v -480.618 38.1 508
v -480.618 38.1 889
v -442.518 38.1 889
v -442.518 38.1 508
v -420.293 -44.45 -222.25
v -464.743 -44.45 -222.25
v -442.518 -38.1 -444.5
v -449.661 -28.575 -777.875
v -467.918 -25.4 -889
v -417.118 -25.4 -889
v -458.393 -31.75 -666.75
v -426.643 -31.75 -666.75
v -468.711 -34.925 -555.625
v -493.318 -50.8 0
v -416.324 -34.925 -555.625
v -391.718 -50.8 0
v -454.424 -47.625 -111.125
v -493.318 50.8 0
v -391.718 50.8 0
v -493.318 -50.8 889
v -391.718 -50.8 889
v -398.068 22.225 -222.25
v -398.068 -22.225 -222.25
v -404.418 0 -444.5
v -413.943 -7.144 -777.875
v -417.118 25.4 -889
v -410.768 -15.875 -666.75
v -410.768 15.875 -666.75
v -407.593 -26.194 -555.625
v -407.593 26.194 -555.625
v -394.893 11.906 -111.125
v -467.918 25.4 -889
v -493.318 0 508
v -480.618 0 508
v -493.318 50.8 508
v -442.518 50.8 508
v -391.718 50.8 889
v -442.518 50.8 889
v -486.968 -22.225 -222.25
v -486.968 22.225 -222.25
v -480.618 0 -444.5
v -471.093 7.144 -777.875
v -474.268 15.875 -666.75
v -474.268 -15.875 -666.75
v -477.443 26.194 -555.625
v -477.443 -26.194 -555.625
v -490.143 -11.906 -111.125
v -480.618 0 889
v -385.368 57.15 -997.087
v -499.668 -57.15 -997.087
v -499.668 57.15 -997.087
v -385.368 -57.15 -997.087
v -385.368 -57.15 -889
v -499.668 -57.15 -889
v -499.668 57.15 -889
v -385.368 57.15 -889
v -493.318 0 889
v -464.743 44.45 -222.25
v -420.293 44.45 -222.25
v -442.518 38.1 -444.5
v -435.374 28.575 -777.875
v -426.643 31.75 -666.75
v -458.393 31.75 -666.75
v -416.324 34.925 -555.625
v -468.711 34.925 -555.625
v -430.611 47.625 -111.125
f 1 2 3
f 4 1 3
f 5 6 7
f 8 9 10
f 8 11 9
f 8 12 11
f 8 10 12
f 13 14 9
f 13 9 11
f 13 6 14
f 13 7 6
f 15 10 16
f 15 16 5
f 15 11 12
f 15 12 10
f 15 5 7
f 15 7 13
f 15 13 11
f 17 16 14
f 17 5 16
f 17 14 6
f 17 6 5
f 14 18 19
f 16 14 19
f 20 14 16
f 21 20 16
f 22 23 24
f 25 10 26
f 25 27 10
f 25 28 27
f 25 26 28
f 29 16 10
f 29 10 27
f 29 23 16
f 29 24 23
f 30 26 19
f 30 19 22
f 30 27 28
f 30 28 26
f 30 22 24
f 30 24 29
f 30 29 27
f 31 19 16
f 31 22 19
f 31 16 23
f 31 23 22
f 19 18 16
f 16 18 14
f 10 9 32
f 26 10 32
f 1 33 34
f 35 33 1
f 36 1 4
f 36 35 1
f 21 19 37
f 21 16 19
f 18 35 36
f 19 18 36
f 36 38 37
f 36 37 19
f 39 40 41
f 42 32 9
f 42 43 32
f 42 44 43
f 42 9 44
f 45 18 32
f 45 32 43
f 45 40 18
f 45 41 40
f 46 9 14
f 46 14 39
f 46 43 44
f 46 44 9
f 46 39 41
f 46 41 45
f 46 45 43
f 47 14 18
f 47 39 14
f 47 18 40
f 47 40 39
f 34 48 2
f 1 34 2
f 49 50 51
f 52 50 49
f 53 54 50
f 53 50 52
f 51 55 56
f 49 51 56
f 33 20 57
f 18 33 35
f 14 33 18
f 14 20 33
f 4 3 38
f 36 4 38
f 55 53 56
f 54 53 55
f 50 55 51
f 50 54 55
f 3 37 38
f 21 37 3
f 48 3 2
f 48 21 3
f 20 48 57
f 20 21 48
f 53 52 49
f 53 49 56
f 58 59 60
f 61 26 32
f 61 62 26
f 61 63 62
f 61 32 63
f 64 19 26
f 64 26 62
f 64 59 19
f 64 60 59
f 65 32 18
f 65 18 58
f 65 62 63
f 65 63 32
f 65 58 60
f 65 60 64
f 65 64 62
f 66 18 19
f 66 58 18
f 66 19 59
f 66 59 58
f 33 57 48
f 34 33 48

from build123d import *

# Parameters (mm, degrees)
F1_DEPTH  = 57.15
F2_DEPTH  = 50.8
F3_W      = 50.8
F3_H      = 50.8
F2_FACE_W = 101.6
F2_FACE_H = 101.6
F6_DEPTH  = 381


with BuildPart() as f1:
    # F0 (on Front) → F1 (new body, symmetric)
    with BuildSketch(Plane.XZ):
        Polygon((-417.117681, -889), (-467.917681, -889), (-499.667681, -889), (-499.667681, -997.087122), (-385.367681, -997.087122), (-385.367681, -889), align=None)
    extrude(amount=F1_DEPTH, both=True)


with BuildPart() as f2:
    # F0 (on Front) → F2 (new body, symmetric)
    with BuildSketch(Plane.XZ):
        Polygon((-391.717681, 889), (-493.317681, 889), (-493.317681, 0), (-467.917681, 0), (-417.117681, 0), (-391.717681, 0), align=None)
    extrude(amount=F2_DEPTH, both=True)

    # F5 (on face) → F6 (cut)
    with BuildSketch(Plane.XY.offset(889)):
        Polygon((-480.617681, 38.1), (-442.517681, 38.1), (-442.517681, 50.8), (-493.317681, 50.8), (-493.317681, 0), (-480.617681, 0), align=None)
    extrude(amount=-F6_DEPTH, mode=Mode.SUBTRACT)


with BuildPart() as f4:
    # F3 (on face) → F4 section 0
    with BuildSketch(Plane.XY.offset(-889)):
        with Locations((-442.517681, 0)):
            Rectangle(F3_W, F3_H)
    # F2_face (on face) → F4 section 1
    with BuildSketch(Plane(origin=(-442.517681, 0, 0), x_dir=(1, 0, 0), z_dir=(0, 0, -1))):
        Rectangle(F2_FACE_W, F2_FACE_H)
    loft()


solid = Compound([f1.part, f2.part, f4.part])
